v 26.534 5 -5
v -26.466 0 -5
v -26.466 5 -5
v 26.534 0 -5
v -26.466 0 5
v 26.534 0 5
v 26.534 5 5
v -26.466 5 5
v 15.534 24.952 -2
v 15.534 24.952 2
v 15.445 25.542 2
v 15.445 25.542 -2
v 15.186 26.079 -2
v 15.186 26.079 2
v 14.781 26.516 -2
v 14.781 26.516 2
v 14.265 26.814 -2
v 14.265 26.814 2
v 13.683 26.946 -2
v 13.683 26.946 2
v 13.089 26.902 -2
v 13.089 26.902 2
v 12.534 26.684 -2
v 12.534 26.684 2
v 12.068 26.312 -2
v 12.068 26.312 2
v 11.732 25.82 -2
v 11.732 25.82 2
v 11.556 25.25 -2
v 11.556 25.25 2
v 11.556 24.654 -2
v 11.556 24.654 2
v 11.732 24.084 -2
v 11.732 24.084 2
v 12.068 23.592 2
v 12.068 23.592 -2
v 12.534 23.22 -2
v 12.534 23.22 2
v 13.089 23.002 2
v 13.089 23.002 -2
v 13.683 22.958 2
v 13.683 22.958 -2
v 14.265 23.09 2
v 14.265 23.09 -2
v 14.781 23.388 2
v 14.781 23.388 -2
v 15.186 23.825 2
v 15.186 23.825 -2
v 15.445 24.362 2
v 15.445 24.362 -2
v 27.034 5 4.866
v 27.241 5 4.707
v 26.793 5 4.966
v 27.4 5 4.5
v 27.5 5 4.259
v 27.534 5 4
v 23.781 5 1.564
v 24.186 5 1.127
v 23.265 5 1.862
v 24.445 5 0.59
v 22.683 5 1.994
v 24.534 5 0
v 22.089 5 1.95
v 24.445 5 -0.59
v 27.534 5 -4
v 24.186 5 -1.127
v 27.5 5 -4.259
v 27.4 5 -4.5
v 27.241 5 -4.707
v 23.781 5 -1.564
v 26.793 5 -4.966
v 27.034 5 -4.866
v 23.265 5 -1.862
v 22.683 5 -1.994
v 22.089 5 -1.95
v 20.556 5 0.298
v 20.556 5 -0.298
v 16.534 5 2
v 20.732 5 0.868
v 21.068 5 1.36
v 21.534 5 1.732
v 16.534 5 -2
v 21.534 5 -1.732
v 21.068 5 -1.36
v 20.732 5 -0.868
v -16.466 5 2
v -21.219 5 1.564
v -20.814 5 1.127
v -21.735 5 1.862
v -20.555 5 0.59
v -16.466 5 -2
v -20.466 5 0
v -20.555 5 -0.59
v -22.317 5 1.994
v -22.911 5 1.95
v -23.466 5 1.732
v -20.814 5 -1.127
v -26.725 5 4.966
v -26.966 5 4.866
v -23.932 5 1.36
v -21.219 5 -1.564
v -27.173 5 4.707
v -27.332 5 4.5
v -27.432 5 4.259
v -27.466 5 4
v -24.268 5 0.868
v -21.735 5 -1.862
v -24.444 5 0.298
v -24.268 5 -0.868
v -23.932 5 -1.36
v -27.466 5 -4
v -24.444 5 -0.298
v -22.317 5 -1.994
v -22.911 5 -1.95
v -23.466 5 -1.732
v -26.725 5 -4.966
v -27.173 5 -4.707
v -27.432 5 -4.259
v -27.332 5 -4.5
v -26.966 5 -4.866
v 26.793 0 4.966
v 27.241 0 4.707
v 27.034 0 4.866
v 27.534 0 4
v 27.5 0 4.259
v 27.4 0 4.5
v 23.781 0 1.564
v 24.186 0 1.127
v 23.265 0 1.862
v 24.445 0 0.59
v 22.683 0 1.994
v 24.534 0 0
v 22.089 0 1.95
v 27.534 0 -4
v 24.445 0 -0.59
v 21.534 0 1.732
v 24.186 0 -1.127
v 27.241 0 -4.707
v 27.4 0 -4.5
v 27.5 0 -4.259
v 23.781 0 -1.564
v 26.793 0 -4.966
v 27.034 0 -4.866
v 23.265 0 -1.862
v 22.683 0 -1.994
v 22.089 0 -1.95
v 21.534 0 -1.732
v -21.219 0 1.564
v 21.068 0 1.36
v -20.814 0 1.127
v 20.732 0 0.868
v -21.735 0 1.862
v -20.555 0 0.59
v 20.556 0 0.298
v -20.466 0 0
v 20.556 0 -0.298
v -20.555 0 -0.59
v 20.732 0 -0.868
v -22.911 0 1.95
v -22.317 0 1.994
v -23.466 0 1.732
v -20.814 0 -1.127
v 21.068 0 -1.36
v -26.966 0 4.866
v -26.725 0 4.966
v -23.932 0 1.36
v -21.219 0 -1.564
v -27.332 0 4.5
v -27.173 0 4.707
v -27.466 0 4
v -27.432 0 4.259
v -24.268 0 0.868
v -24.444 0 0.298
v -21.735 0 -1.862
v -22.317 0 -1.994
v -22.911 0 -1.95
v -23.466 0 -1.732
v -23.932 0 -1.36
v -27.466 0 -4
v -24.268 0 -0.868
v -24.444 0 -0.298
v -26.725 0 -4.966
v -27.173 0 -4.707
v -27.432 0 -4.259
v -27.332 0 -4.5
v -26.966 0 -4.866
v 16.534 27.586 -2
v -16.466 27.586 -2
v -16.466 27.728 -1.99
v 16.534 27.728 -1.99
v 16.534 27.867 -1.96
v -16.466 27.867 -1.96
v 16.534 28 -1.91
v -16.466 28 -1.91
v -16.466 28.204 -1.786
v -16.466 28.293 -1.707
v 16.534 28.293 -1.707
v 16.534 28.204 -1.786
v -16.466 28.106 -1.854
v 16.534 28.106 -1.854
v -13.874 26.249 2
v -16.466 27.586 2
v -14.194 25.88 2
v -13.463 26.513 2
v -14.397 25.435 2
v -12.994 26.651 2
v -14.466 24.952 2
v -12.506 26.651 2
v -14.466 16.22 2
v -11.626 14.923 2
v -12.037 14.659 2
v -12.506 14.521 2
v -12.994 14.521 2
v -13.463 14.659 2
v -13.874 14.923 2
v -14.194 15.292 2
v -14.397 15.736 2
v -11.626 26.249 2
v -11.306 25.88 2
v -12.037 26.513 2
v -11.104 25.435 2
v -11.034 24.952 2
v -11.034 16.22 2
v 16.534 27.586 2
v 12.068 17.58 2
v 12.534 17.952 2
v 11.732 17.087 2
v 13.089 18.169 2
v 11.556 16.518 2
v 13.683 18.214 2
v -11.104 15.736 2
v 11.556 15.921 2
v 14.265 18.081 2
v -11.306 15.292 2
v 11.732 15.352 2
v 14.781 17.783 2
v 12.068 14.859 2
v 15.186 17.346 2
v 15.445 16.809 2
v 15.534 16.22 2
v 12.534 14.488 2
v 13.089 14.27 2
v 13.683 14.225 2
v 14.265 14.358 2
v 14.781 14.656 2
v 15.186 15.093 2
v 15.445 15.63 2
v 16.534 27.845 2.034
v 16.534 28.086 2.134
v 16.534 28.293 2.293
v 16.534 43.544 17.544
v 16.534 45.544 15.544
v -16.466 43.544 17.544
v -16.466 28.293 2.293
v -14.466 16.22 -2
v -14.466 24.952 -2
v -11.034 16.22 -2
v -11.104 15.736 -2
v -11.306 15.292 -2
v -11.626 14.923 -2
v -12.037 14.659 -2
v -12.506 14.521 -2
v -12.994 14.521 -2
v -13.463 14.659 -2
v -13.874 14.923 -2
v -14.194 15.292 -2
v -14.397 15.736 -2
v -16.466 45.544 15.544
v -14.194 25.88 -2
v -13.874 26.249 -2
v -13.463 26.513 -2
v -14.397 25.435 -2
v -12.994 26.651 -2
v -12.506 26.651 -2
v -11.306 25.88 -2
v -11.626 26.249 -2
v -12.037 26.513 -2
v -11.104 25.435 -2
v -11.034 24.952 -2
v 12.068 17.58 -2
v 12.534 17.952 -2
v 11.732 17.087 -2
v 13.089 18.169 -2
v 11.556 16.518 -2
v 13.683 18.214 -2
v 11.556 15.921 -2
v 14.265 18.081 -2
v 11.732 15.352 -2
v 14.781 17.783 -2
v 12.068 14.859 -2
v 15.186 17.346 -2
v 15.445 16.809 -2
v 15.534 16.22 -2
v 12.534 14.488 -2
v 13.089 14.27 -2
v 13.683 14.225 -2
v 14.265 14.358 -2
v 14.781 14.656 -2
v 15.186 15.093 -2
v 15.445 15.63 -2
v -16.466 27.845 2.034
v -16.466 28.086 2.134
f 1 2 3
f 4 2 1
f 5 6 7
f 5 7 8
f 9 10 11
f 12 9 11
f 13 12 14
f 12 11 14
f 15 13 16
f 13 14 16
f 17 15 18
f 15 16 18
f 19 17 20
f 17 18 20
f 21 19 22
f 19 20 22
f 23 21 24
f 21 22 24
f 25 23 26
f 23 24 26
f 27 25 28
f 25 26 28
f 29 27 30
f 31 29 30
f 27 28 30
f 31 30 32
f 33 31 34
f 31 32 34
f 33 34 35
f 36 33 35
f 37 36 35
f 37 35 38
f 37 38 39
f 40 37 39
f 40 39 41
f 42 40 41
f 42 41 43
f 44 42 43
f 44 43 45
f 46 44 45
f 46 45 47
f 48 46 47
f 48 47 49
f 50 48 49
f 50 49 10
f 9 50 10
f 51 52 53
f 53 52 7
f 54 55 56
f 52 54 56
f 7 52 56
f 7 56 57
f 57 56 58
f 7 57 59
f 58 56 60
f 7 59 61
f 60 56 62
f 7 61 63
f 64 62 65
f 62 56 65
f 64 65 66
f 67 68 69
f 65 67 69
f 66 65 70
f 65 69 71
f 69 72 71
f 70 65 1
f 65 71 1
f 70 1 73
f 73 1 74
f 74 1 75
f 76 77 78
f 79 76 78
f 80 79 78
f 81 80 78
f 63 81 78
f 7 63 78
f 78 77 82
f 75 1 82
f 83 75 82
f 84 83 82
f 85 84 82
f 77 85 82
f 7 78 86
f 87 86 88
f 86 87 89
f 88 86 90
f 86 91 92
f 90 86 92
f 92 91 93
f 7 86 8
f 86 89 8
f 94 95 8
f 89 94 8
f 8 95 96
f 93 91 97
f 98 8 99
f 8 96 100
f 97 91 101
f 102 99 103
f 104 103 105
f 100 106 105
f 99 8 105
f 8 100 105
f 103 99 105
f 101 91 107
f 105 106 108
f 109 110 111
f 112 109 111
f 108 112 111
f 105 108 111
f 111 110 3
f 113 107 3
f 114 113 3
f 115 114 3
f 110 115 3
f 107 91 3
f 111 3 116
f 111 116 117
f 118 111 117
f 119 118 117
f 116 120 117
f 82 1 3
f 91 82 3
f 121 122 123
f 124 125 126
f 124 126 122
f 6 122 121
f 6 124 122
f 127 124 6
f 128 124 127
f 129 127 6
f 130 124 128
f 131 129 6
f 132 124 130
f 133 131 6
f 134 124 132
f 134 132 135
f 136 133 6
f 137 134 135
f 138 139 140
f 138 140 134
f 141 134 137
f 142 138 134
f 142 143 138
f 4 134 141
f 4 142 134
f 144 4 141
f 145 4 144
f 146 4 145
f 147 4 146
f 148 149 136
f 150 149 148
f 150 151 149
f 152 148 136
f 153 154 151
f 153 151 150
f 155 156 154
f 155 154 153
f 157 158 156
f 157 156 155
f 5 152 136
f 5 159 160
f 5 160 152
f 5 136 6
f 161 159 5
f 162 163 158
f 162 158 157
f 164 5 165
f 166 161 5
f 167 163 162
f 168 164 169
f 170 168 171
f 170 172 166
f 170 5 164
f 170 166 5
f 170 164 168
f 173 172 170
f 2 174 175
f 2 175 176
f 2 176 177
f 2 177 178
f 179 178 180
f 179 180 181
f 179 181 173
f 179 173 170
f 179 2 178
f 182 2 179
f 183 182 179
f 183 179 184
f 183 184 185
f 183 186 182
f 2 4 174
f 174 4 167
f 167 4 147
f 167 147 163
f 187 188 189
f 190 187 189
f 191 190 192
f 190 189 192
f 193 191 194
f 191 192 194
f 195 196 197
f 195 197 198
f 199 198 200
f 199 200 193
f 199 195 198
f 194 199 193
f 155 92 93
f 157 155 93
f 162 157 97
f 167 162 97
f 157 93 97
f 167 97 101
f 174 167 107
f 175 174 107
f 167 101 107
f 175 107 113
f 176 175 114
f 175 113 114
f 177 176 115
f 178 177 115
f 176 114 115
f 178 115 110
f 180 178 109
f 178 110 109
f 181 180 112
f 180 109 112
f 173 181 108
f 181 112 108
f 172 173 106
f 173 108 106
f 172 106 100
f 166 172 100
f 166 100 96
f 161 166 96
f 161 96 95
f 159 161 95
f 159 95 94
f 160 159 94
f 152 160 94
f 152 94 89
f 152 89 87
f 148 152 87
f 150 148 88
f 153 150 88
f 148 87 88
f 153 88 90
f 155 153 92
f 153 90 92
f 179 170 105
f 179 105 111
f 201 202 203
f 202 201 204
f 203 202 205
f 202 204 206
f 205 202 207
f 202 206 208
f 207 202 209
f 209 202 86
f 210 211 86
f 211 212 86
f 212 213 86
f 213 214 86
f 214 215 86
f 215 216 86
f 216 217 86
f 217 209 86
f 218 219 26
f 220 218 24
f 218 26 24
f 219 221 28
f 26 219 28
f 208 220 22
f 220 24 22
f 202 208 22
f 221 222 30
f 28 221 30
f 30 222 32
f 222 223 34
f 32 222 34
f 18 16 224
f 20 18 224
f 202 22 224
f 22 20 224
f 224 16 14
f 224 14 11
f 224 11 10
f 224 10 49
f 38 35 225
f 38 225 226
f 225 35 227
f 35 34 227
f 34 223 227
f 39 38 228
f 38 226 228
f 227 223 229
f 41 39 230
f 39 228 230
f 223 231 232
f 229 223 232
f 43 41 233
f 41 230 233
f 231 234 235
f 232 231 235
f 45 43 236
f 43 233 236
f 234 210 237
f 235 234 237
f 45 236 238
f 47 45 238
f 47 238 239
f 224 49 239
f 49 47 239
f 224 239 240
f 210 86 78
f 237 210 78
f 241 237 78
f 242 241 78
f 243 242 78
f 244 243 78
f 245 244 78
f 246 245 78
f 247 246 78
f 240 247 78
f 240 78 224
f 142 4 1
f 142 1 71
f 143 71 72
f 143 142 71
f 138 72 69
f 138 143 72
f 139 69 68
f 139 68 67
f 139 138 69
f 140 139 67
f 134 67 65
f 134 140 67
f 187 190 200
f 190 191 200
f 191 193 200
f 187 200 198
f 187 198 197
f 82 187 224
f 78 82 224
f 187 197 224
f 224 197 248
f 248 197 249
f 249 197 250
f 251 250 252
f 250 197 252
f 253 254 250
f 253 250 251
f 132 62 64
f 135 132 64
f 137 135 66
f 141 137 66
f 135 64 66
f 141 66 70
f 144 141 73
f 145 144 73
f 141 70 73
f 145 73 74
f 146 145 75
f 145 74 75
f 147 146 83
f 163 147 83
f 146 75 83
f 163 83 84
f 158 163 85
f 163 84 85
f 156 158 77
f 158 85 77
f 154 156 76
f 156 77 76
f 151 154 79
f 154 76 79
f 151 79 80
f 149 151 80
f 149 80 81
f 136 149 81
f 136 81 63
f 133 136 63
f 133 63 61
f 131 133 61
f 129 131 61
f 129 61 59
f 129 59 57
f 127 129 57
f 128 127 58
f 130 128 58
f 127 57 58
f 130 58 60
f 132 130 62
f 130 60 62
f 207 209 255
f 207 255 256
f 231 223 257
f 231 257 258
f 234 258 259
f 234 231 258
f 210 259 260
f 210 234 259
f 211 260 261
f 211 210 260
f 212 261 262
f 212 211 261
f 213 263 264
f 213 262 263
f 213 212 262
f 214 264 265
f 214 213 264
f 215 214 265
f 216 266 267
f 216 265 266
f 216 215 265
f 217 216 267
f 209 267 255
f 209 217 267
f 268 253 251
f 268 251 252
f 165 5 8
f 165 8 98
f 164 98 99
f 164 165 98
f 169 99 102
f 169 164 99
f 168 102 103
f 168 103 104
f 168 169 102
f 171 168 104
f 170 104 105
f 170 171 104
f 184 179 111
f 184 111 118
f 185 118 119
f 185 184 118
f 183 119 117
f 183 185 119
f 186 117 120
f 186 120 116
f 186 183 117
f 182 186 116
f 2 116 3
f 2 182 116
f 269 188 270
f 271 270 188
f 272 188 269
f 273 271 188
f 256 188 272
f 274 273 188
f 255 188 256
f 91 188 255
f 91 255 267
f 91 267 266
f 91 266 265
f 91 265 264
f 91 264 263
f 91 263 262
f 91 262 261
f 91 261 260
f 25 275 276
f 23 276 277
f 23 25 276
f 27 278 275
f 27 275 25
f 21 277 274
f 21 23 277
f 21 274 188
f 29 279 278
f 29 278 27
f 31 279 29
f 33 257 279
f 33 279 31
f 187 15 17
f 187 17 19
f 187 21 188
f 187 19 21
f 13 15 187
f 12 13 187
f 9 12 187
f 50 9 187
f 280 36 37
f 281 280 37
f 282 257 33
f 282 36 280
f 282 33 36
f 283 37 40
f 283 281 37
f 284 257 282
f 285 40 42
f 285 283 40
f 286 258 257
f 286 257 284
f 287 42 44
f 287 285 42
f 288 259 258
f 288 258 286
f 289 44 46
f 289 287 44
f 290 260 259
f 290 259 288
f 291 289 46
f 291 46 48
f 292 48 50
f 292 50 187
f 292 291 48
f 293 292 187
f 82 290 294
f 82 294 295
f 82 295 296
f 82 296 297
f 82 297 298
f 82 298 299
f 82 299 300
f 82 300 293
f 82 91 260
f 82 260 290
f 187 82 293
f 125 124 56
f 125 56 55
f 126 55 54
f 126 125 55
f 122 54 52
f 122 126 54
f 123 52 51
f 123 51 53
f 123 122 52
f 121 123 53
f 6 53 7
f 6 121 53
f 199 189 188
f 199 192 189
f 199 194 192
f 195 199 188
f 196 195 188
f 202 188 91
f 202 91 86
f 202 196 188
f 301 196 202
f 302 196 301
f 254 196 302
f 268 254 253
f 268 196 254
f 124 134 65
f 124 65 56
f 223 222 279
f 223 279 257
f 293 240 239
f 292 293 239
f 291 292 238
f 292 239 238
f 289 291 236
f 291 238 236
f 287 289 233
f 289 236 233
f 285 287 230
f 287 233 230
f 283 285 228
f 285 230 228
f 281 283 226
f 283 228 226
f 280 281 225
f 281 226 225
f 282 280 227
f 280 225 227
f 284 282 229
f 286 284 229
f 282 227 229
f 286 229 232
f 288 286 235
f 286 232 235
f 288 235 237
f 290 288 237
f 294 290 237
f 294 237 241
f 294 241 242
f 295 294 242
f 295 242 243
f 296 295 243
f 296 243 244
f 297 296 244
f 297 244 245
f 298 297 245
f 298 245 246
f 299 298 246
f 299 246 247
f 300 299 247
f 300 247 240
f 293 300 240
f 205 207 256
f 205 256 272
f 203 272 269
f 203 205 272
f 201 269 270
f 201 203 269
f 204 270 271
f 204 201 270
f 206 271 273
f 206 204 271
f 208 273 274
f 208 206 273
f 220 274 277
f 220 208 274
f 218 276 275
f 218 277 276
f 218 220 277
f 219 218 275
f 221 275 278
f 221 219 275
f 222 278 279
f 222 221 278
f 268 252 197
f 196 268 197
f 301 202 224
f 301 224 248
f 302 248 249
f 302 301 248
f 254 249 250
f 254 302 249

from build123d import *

# Parameters (mm, degrees)
EXTRUDE_2_DEPTH     = 5
SKETCH_4_W          = 33
SKETCH_4_H          = 4
EXTRUDE_3_DEPTH     = 23
EXTRUDE_4_DEPTH     = 33
SKETCH_11_R         = 2
CUT_EXTRUDE_1_DEPTH = 14
CUT_EXTRUDE_2_DEPTH = 33
SKETCH_17_R         = 2
CUT_EXTRUDE_3_DEPTH = 5
SKETCH_19_W         = 37
SKETCH_19_H         = 10
EXTRUDE_5_DEPTH     = 5


with BuildPart() as part:
    # 草图1 → 凸台-拉伸2 (new body)
    with BuildSketch(Plane(origin=(0, 0, 0), x_dir=(1, 0, 0), z_dir=(0, 1, 0))):
        with BuildLine():
            Line((26.533821687, -5), (18.533821687, -5))
            ThreePointArc((18.533821687, -5), (17.826714906, -4.707106781), (17.533821687, -4))
            Line((17.533821687, -4), (17.533821687, -3))
            ThreePointArc((17.533821687, -3), (17.240928468, -2.292893219), (16.533821687, -2))
            Line((16.533821687, -2), (-16.466178313, -2))
            ThreePointArc((-16.466178313, -2), (-17.173285094, -2.292893219), (-17.466178313, -3))
            Line((-17.466178313, -3), (-17.466178313, -4))
            ThreePointArc((-17.466178313, -4), (-17.759071532, -4.707106781), (-18.466178313, -5))
            Line((-18.466178313, -5), (-26.466178313, -5))
            ThreePointArc((-26.466178313, -5), (-27.173285094, -4.707106781), (-27.466178313, -4))
            Line((-27.466178313, -4), (-27.466178313, 4))
            ThreePointArc((-27.466178313, 4), (-27.173285094, 4.707106781), (-26.466178313, 5))
            Line((-26.466178313, 5), (-18.466178313, 5))
            ThreePointArc((-18.466178313, 5), (-17.759071532, 4.707106781), (-17.466178313, 4))
            Line((-17.466178313, 4), (-17.466178313, 3))
            ThreePointArc((-17.466178313, 3), (-17.173285094, 2.292893219), (-16.466178313, 2))
            Line((-16.466178313, 2), (16.533821687, 2))
            ThreePointArc((16.533821687, 2), (17.240928468, 2.292893219), (17.533821687, 3))
            Line((17.533821687, 3), (17.533821687, 4))
            ThreePointArc((17.533821687, 4), (17.826714906, 4.707106781), (18.533821687, 5))
            Line((18.533821687, 5), (26.533821687, 5))
            ThreePointArc((26.533821687, 5), (27.240928468, 4.707106781), (27.533821687, 4))
            Line((27.533821687, 4), (27.533821687, -4))
            ThreePointArc((27.533821687, -4), (27.240928468, -4.707106781), (26.533821687, -5))
        make_face()
    extrude(amount=EXTRUDE_2_DEPTH)

    # 草图4 → 凸台-拉伸3 (add)
    with BuildSketch(Plane(origin=(0, 5, 0), x_dir=(1, 0, 0), z_dir=(0, 1, 0))):
        with Locations((0.033821687, 0)):
            Rectangle(SKETCH_4_W, SKETCH_4_H)
    extrude(amount=EXTRUDE_3_DEPTH)

    # 草图5 → 凸台-拉伸4 (add)
    with BuildSketch(Plane.ZY.offset(16.466178313)):
        with BuildLine():
            ThreePointArc((2, 27.585786438), (2.076120467, 27.96846987), (2.292893219, 28.292893219))
            Line((2.292893219, 28.292893219), (17.54448252, 43.54448252))
            Line((17.54448252, 43.54448252), (15.54448252, 45.54448252))
            Line((15.54448252, 45.54448252), (-1.707106781, 28.292893219))
            ThreePointArc((-1.707106781, 28.292893219), (-1.821797126, 28.155566643), (-1.910179721, 28))
            Line((-1.910179721, 28), (2, 28))
            Line((2, 28), (2, 27.585786438))
        make_face()
    extrude(amount=-EXTRUDE_4_DEPTH)

    # 草图11 → 切除-拉伸1 (cut)
    with BuildSketch(Plane.XY.offset(2)):
        with Locations((13.533821687, 24.952009276)):
            Circle(SKETCH_11_R)
        with Locations((13.533821687, 16.219563599)):
            Circle(SKETCH_11_R)
        with BuildLine():
            Line((-11.034001398, 24.952009276), (-11.034001398, 16.219563599))
            ThreePointArc((-11.034001398, 16.219563599), (-12.750089855, 14.503475142), (-14.466178313, 16.219563599))
            Line((-14.466178313, 16.219563599), (-14.466178313, 24.952009276))
            ThreePointArc((-14.466178313, 24.952009276), (-12.750089855, 26.668097734), (-11.034001398, 24.952009276))
        make_face()
    extrude(amount=-CUT_EXTRUDE_1_DEPTH, mode=Mode.SUBTRACT)

    # 草图16 → 切除-拉伸2 (cut)
    with BuildSketch(Plane.ZY.offset(16.466178313)):
        with BuildLine():
            Line((-1.910179721, 28), (-2, 28))
            Line((-2, 28), (-2, 27.585786438))
            ThreePointArc((-2, 27.585786438), (-1.97728699, 27.797706563), (-1.910179721, 28))
        make_face()
    extrude(amount=-CUT_EXTRUDE_2_DEPTH, mode=Mode.SUBTRACT)

    # 草图17 → 切除-拉伸3 (cut)
    with BuildSketch(Plane(origin=(0, 5, 0), x_dir=(1, 0, 0), z_dir=(0, 1, 0))):
        with Locations((22.533821687, 0)):
            Circle(SKETCH_17_R)
        with Locations((-22.466178313, 0)):
            Circle(SKETCH_17_R)
    extrude(amount=-CUT_EXTRUDE_3_DEPTH, mode=Mode.SUBTRACT)

    # 草图19 → 凸台-拉伸5 (add)
    with BuildSketch(Plane(origin=(0, 5, 0), x_dir=(1, 0, 0), z_dir=(0, 1, 0))):
        with Locations((0.033821687, 0)):
            Rectangle(SKETCH_19_W, SKETCH_19_H)
    extrude(amount=-EXTRUDE_5_DEPTH)


solid = part.part
